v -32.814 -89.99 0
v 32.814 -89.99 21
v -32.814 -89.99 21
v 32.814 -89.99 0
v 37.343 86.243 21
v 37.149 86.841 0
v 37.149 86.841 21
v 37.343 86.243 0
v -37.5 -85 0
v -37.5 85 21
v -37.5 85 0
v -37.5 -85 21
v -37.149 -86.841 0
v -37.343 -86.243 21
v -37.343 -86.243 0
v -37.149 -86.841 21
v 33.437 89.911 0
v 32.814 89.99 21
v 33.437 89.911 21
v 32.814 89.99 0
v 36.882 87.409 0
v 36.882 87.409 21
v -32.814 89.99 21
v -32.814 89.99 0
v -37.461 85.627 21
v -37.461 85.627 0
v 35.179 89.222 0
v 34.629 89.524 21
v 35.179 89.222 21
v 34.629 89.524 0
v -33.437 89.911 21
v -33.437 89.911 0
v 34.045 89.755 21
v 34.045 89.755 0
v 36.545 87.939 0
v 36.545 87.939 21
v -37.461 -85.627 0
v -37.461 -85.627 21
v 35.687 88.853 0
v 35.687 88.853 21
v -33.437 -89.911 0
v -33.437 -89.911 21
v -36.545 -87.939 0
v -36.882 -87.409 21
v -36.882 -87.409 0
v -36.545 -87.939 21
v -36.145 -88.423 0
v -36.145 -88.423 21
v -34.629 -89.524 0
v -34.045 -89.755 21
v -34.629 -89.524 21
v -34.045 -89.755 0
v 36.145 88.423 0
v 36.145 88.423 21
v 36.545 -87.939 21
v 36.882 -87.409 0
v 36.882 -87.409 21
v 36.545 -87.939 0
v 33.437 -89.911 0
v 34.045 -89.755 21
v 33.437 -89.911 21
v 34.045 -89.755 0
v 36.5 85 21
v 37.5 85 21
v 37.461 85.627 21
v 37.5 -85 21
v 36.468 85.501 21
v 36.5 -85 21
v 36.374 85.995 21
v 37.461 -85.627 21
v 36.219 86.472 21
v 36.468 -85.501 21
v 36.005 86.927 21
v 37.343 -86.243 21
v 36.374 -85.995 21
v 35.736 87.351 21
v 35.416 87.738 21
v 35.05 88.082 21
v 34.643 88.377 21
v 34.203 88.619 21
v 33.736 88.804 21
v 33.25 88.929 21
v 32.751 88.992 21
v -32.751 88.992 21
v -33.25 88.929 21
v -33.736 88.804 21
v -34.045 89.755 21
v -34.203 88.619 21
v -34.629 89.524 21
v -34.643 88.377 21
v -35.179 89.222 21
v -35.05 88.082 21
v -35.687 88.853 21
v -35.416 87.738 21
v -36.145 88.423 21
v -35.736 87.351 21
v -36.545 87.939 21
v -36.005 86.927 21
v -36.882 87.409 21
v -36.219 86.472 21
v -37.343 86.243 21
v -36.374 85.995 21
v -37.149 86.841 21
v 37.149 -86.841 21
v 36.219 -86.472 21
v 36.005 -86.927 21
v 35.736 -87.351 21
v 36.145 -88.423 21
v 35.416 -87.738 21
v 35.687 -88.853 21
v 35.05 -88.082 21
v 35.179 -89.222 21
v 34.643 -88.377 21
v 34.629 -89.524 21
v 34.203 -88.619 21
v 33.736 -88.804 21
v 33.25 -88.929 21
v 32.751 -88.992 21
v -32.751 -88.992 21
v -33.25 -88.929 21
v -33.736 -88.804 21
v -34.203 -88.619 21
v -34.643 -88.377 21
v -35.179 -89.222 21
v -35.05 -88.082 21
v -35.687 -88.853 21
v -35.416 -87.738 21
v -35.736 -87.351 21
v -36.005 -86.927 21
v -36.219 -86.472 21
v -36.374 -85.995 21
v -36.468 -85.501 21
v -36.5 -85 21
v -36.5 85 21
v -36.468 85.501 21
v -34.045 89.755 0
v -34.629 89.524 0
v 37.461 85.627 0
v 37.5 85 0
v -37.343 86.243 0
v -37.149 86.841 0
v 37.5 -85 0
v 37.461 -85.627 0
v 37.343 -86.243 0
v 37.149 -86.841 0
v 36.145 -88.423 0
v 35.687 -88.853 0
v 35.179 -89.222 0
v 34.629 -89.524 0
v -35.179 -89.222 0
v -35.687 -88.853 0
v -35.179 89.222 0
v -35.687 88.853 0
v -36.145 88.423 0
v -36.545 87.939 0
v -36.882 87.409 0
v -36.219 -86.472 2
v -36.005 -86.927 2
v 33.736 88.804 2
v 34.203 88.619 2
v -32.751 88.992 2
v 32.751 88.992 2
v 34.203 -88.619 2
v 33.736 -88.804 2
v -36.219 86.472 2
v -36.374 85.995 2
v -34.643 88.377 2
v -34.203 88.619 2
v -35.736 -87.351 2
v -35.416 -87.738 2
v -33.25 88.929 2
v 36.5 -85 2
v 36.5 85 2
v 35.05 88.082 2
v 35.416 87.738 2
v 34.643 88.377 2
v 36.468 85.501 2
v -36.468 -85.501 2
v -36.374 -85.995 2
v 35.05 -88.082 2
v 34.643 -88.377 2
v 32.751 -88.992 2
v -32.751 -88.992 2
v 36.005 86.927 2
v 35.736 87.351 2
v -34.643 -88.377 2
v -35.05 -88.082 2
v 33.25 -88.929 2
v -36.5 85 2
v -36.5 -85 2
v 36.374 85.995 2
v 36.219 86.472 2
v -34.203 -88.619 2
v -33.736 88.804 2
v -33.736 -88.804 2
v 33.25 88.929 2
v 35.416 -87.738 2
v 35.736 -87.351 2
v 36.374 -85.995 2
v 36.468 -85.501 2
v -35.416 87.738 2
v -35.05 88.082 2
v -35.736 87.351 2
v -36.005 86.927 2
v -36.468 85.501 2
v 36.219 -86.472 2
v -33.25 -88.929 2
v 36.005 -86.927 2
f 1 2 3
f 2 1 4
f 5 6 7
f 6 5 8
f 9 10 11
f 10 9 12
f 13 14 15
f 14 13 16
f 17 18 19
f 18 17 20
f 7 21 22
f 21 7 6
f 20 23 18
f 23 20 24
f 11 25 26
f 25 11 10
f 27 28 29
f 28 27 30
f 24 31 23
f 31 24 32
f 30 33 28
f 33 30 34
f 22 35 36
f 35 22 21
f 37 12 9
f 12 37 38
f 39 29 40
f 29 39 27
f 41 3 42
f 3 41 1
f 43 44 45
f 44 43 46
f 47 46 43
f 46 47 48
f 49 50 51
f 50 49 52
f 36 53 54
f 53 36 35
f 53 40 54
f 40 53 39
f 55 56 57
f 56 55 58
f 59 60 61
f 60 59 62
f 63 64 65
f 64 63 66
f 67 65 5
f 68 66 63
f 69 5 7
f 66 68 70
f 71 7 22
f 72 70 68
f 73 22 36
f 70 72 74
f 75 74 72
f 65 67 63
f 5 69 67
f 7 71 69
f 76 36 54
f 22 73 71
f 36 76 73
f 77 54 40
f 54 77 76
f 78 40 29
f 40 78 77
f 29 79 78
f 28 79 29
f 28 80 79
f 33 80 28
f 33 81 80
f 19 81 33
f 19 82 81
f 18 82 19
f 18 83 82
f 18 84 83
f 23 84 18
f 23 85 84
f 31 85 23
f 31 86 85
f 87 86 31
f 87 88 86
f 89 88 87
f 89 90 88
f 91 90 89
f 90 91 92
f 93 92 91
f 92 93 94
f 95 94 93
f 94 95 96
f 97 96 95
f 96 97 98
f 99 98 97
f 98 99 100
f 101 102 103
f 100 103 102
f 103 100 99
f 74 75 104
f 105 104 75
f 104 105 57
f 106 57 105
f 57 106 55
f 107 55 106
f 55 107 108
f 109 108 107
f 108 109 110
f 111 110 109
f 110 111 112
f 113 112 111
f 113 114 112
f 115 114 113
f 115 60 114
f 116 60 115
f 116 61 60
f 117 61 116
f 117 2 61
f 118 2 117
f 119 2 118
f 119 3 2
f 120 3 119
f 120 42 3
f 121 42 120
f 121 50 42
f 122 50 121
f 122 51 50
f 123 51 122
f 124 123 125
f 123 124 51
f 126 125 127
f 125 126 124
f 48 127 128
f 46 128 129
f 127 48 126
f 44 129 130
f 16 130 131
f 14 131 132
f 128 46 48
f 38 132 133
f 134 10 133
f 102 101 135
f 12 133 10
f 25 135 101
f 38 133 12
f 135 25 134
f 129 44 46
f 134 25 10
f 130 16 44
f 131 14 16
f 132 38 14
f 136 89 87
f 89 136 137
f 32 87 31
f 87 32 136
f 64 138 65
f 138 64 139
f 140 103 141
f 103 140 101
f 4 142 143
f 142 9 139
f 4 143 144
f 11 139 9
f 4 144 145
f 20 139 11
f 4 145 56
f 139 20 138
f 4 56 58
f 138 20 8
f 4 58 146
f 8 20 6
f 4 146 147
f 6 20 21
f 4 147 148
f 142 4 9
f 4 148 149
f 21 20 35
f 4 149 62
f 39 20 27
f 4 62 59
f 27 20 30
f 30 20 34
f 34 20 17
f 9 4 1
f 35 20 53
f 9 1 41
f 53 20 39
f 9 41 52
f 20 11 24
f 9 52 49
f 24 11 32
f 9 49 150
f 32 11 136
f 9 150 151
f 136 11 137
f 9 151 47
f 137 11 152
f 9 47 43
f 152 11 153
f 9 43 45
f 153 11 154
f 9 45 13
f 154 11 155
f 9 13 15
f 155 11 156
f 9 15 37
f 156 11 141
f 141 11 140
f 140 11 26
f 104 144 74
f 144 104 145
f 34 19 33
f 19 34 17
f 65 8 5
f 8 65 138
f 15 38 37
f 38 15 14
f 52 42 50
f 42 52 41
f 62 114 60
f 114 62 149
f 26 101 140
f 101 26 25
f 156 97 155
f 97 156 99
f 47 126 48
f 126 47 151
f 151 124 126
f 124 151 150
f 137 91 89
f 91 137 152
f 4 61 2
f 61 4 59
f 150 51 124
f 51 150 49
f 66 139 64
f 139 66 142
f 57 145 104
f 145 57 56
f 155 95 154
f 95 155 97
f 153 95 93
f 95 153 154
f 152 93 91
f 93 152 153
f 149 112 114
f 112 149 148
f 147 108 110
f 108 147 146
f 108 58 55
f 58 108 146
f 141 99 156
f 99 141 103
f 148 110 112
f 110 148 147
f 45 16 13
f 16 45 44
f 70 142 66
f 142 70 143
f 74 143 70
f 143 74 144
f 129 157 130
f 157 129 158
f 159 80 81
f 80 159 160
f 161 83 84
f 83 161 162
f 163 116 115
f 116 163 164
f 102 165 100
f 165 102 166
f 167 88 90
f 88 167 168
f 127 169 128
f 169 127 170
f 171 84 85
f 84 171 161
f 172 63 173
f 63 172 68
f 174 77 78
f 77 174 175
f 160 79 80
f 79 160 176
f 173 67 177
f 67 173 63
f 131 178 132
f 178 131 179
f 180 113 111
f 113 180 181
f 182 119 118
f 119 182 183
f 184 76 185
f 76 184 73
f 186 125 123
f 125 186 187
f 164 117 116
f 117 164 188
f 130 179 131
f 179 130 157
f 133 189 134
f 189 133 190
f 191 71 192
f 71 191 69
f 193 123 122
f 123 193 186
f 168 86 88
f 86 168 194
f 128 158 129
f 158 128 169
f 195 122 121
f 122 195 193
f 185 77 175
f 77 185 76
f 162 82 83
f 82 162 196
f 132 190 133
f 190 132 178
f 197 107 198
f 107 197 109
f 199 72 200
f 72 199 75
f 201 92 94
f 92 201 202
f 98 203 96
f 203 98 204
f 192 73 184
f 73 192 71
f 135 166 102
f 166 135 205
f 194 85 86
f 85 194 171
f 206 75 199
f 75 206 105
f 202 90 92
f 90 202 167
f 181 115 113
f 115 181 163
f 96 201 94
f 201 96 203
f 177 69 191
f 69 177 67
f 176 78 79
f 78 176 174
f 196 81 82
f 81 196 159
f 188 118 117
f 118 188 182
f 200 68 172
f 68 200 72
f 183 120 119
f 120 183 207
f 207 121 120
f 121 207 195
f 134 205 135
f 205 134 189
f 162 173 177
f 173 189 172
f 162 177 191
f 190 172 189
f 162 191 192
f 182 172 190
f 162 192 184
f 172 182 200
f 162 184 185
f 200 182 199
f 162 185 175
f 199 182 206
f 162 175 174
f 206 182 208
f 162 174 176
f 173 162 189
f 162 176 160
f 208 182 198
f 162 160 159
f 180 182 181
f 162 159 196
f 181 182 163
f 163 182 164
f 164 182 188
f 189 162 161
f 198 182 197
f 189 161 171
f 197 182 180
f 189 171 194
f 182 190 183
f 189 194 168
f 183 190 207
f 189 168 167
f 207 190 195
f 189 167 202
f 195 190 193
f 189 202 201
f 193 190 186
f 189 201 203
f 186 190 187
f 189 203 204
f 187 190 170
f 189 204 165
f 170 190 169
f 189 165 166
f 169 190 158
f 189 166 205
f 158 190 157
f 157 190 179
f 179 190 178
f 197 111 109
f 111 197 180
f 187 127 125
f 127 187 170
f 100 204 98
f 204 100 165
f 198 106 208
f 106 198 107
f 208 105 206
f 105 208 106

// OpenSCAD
$fn = 50;


difference() {
	union() {
		hull() {
			translate(v = [-32.5000000000, 85.0000000000, 0]) {
				cylinder(h = 21, r = 5);
			}
			translate(v = [32.5000000000, 85.0000000000, 0]) {
				cylinder(h = 21, r = 5);
			}
			translate(v = [-32.5000000000, -85.0000000000, 0]) {
				cylinder(h = 21, r = 5);
			}
			translate(v = [32.5000000000, -85.0000000000, 0]) {
				cylinder(h = 21, r = 5);
			}
		}
	}
	union() {
		translate(v = [0, 0, 2]) {
			hull() {
				translate(v = [-32.5000000000, 85.0000000000, 0]) {
					cylinder(h = 19, r = 4);
				}
				translate(v = [32.5000000000, 85.0000000000, 0]) {
					cylinder(h = 19, r = 4);
				}
				translate(v = [-32.5000000000, -85.0000000000, 0]) {
					cylinder(h = 19, r = 4);
				}
				translate(v = [32.5000000000, -85.0000000000, 0]) {
					cylinder(h = 19, r = 4);
				}
			}
		}
	}
}
